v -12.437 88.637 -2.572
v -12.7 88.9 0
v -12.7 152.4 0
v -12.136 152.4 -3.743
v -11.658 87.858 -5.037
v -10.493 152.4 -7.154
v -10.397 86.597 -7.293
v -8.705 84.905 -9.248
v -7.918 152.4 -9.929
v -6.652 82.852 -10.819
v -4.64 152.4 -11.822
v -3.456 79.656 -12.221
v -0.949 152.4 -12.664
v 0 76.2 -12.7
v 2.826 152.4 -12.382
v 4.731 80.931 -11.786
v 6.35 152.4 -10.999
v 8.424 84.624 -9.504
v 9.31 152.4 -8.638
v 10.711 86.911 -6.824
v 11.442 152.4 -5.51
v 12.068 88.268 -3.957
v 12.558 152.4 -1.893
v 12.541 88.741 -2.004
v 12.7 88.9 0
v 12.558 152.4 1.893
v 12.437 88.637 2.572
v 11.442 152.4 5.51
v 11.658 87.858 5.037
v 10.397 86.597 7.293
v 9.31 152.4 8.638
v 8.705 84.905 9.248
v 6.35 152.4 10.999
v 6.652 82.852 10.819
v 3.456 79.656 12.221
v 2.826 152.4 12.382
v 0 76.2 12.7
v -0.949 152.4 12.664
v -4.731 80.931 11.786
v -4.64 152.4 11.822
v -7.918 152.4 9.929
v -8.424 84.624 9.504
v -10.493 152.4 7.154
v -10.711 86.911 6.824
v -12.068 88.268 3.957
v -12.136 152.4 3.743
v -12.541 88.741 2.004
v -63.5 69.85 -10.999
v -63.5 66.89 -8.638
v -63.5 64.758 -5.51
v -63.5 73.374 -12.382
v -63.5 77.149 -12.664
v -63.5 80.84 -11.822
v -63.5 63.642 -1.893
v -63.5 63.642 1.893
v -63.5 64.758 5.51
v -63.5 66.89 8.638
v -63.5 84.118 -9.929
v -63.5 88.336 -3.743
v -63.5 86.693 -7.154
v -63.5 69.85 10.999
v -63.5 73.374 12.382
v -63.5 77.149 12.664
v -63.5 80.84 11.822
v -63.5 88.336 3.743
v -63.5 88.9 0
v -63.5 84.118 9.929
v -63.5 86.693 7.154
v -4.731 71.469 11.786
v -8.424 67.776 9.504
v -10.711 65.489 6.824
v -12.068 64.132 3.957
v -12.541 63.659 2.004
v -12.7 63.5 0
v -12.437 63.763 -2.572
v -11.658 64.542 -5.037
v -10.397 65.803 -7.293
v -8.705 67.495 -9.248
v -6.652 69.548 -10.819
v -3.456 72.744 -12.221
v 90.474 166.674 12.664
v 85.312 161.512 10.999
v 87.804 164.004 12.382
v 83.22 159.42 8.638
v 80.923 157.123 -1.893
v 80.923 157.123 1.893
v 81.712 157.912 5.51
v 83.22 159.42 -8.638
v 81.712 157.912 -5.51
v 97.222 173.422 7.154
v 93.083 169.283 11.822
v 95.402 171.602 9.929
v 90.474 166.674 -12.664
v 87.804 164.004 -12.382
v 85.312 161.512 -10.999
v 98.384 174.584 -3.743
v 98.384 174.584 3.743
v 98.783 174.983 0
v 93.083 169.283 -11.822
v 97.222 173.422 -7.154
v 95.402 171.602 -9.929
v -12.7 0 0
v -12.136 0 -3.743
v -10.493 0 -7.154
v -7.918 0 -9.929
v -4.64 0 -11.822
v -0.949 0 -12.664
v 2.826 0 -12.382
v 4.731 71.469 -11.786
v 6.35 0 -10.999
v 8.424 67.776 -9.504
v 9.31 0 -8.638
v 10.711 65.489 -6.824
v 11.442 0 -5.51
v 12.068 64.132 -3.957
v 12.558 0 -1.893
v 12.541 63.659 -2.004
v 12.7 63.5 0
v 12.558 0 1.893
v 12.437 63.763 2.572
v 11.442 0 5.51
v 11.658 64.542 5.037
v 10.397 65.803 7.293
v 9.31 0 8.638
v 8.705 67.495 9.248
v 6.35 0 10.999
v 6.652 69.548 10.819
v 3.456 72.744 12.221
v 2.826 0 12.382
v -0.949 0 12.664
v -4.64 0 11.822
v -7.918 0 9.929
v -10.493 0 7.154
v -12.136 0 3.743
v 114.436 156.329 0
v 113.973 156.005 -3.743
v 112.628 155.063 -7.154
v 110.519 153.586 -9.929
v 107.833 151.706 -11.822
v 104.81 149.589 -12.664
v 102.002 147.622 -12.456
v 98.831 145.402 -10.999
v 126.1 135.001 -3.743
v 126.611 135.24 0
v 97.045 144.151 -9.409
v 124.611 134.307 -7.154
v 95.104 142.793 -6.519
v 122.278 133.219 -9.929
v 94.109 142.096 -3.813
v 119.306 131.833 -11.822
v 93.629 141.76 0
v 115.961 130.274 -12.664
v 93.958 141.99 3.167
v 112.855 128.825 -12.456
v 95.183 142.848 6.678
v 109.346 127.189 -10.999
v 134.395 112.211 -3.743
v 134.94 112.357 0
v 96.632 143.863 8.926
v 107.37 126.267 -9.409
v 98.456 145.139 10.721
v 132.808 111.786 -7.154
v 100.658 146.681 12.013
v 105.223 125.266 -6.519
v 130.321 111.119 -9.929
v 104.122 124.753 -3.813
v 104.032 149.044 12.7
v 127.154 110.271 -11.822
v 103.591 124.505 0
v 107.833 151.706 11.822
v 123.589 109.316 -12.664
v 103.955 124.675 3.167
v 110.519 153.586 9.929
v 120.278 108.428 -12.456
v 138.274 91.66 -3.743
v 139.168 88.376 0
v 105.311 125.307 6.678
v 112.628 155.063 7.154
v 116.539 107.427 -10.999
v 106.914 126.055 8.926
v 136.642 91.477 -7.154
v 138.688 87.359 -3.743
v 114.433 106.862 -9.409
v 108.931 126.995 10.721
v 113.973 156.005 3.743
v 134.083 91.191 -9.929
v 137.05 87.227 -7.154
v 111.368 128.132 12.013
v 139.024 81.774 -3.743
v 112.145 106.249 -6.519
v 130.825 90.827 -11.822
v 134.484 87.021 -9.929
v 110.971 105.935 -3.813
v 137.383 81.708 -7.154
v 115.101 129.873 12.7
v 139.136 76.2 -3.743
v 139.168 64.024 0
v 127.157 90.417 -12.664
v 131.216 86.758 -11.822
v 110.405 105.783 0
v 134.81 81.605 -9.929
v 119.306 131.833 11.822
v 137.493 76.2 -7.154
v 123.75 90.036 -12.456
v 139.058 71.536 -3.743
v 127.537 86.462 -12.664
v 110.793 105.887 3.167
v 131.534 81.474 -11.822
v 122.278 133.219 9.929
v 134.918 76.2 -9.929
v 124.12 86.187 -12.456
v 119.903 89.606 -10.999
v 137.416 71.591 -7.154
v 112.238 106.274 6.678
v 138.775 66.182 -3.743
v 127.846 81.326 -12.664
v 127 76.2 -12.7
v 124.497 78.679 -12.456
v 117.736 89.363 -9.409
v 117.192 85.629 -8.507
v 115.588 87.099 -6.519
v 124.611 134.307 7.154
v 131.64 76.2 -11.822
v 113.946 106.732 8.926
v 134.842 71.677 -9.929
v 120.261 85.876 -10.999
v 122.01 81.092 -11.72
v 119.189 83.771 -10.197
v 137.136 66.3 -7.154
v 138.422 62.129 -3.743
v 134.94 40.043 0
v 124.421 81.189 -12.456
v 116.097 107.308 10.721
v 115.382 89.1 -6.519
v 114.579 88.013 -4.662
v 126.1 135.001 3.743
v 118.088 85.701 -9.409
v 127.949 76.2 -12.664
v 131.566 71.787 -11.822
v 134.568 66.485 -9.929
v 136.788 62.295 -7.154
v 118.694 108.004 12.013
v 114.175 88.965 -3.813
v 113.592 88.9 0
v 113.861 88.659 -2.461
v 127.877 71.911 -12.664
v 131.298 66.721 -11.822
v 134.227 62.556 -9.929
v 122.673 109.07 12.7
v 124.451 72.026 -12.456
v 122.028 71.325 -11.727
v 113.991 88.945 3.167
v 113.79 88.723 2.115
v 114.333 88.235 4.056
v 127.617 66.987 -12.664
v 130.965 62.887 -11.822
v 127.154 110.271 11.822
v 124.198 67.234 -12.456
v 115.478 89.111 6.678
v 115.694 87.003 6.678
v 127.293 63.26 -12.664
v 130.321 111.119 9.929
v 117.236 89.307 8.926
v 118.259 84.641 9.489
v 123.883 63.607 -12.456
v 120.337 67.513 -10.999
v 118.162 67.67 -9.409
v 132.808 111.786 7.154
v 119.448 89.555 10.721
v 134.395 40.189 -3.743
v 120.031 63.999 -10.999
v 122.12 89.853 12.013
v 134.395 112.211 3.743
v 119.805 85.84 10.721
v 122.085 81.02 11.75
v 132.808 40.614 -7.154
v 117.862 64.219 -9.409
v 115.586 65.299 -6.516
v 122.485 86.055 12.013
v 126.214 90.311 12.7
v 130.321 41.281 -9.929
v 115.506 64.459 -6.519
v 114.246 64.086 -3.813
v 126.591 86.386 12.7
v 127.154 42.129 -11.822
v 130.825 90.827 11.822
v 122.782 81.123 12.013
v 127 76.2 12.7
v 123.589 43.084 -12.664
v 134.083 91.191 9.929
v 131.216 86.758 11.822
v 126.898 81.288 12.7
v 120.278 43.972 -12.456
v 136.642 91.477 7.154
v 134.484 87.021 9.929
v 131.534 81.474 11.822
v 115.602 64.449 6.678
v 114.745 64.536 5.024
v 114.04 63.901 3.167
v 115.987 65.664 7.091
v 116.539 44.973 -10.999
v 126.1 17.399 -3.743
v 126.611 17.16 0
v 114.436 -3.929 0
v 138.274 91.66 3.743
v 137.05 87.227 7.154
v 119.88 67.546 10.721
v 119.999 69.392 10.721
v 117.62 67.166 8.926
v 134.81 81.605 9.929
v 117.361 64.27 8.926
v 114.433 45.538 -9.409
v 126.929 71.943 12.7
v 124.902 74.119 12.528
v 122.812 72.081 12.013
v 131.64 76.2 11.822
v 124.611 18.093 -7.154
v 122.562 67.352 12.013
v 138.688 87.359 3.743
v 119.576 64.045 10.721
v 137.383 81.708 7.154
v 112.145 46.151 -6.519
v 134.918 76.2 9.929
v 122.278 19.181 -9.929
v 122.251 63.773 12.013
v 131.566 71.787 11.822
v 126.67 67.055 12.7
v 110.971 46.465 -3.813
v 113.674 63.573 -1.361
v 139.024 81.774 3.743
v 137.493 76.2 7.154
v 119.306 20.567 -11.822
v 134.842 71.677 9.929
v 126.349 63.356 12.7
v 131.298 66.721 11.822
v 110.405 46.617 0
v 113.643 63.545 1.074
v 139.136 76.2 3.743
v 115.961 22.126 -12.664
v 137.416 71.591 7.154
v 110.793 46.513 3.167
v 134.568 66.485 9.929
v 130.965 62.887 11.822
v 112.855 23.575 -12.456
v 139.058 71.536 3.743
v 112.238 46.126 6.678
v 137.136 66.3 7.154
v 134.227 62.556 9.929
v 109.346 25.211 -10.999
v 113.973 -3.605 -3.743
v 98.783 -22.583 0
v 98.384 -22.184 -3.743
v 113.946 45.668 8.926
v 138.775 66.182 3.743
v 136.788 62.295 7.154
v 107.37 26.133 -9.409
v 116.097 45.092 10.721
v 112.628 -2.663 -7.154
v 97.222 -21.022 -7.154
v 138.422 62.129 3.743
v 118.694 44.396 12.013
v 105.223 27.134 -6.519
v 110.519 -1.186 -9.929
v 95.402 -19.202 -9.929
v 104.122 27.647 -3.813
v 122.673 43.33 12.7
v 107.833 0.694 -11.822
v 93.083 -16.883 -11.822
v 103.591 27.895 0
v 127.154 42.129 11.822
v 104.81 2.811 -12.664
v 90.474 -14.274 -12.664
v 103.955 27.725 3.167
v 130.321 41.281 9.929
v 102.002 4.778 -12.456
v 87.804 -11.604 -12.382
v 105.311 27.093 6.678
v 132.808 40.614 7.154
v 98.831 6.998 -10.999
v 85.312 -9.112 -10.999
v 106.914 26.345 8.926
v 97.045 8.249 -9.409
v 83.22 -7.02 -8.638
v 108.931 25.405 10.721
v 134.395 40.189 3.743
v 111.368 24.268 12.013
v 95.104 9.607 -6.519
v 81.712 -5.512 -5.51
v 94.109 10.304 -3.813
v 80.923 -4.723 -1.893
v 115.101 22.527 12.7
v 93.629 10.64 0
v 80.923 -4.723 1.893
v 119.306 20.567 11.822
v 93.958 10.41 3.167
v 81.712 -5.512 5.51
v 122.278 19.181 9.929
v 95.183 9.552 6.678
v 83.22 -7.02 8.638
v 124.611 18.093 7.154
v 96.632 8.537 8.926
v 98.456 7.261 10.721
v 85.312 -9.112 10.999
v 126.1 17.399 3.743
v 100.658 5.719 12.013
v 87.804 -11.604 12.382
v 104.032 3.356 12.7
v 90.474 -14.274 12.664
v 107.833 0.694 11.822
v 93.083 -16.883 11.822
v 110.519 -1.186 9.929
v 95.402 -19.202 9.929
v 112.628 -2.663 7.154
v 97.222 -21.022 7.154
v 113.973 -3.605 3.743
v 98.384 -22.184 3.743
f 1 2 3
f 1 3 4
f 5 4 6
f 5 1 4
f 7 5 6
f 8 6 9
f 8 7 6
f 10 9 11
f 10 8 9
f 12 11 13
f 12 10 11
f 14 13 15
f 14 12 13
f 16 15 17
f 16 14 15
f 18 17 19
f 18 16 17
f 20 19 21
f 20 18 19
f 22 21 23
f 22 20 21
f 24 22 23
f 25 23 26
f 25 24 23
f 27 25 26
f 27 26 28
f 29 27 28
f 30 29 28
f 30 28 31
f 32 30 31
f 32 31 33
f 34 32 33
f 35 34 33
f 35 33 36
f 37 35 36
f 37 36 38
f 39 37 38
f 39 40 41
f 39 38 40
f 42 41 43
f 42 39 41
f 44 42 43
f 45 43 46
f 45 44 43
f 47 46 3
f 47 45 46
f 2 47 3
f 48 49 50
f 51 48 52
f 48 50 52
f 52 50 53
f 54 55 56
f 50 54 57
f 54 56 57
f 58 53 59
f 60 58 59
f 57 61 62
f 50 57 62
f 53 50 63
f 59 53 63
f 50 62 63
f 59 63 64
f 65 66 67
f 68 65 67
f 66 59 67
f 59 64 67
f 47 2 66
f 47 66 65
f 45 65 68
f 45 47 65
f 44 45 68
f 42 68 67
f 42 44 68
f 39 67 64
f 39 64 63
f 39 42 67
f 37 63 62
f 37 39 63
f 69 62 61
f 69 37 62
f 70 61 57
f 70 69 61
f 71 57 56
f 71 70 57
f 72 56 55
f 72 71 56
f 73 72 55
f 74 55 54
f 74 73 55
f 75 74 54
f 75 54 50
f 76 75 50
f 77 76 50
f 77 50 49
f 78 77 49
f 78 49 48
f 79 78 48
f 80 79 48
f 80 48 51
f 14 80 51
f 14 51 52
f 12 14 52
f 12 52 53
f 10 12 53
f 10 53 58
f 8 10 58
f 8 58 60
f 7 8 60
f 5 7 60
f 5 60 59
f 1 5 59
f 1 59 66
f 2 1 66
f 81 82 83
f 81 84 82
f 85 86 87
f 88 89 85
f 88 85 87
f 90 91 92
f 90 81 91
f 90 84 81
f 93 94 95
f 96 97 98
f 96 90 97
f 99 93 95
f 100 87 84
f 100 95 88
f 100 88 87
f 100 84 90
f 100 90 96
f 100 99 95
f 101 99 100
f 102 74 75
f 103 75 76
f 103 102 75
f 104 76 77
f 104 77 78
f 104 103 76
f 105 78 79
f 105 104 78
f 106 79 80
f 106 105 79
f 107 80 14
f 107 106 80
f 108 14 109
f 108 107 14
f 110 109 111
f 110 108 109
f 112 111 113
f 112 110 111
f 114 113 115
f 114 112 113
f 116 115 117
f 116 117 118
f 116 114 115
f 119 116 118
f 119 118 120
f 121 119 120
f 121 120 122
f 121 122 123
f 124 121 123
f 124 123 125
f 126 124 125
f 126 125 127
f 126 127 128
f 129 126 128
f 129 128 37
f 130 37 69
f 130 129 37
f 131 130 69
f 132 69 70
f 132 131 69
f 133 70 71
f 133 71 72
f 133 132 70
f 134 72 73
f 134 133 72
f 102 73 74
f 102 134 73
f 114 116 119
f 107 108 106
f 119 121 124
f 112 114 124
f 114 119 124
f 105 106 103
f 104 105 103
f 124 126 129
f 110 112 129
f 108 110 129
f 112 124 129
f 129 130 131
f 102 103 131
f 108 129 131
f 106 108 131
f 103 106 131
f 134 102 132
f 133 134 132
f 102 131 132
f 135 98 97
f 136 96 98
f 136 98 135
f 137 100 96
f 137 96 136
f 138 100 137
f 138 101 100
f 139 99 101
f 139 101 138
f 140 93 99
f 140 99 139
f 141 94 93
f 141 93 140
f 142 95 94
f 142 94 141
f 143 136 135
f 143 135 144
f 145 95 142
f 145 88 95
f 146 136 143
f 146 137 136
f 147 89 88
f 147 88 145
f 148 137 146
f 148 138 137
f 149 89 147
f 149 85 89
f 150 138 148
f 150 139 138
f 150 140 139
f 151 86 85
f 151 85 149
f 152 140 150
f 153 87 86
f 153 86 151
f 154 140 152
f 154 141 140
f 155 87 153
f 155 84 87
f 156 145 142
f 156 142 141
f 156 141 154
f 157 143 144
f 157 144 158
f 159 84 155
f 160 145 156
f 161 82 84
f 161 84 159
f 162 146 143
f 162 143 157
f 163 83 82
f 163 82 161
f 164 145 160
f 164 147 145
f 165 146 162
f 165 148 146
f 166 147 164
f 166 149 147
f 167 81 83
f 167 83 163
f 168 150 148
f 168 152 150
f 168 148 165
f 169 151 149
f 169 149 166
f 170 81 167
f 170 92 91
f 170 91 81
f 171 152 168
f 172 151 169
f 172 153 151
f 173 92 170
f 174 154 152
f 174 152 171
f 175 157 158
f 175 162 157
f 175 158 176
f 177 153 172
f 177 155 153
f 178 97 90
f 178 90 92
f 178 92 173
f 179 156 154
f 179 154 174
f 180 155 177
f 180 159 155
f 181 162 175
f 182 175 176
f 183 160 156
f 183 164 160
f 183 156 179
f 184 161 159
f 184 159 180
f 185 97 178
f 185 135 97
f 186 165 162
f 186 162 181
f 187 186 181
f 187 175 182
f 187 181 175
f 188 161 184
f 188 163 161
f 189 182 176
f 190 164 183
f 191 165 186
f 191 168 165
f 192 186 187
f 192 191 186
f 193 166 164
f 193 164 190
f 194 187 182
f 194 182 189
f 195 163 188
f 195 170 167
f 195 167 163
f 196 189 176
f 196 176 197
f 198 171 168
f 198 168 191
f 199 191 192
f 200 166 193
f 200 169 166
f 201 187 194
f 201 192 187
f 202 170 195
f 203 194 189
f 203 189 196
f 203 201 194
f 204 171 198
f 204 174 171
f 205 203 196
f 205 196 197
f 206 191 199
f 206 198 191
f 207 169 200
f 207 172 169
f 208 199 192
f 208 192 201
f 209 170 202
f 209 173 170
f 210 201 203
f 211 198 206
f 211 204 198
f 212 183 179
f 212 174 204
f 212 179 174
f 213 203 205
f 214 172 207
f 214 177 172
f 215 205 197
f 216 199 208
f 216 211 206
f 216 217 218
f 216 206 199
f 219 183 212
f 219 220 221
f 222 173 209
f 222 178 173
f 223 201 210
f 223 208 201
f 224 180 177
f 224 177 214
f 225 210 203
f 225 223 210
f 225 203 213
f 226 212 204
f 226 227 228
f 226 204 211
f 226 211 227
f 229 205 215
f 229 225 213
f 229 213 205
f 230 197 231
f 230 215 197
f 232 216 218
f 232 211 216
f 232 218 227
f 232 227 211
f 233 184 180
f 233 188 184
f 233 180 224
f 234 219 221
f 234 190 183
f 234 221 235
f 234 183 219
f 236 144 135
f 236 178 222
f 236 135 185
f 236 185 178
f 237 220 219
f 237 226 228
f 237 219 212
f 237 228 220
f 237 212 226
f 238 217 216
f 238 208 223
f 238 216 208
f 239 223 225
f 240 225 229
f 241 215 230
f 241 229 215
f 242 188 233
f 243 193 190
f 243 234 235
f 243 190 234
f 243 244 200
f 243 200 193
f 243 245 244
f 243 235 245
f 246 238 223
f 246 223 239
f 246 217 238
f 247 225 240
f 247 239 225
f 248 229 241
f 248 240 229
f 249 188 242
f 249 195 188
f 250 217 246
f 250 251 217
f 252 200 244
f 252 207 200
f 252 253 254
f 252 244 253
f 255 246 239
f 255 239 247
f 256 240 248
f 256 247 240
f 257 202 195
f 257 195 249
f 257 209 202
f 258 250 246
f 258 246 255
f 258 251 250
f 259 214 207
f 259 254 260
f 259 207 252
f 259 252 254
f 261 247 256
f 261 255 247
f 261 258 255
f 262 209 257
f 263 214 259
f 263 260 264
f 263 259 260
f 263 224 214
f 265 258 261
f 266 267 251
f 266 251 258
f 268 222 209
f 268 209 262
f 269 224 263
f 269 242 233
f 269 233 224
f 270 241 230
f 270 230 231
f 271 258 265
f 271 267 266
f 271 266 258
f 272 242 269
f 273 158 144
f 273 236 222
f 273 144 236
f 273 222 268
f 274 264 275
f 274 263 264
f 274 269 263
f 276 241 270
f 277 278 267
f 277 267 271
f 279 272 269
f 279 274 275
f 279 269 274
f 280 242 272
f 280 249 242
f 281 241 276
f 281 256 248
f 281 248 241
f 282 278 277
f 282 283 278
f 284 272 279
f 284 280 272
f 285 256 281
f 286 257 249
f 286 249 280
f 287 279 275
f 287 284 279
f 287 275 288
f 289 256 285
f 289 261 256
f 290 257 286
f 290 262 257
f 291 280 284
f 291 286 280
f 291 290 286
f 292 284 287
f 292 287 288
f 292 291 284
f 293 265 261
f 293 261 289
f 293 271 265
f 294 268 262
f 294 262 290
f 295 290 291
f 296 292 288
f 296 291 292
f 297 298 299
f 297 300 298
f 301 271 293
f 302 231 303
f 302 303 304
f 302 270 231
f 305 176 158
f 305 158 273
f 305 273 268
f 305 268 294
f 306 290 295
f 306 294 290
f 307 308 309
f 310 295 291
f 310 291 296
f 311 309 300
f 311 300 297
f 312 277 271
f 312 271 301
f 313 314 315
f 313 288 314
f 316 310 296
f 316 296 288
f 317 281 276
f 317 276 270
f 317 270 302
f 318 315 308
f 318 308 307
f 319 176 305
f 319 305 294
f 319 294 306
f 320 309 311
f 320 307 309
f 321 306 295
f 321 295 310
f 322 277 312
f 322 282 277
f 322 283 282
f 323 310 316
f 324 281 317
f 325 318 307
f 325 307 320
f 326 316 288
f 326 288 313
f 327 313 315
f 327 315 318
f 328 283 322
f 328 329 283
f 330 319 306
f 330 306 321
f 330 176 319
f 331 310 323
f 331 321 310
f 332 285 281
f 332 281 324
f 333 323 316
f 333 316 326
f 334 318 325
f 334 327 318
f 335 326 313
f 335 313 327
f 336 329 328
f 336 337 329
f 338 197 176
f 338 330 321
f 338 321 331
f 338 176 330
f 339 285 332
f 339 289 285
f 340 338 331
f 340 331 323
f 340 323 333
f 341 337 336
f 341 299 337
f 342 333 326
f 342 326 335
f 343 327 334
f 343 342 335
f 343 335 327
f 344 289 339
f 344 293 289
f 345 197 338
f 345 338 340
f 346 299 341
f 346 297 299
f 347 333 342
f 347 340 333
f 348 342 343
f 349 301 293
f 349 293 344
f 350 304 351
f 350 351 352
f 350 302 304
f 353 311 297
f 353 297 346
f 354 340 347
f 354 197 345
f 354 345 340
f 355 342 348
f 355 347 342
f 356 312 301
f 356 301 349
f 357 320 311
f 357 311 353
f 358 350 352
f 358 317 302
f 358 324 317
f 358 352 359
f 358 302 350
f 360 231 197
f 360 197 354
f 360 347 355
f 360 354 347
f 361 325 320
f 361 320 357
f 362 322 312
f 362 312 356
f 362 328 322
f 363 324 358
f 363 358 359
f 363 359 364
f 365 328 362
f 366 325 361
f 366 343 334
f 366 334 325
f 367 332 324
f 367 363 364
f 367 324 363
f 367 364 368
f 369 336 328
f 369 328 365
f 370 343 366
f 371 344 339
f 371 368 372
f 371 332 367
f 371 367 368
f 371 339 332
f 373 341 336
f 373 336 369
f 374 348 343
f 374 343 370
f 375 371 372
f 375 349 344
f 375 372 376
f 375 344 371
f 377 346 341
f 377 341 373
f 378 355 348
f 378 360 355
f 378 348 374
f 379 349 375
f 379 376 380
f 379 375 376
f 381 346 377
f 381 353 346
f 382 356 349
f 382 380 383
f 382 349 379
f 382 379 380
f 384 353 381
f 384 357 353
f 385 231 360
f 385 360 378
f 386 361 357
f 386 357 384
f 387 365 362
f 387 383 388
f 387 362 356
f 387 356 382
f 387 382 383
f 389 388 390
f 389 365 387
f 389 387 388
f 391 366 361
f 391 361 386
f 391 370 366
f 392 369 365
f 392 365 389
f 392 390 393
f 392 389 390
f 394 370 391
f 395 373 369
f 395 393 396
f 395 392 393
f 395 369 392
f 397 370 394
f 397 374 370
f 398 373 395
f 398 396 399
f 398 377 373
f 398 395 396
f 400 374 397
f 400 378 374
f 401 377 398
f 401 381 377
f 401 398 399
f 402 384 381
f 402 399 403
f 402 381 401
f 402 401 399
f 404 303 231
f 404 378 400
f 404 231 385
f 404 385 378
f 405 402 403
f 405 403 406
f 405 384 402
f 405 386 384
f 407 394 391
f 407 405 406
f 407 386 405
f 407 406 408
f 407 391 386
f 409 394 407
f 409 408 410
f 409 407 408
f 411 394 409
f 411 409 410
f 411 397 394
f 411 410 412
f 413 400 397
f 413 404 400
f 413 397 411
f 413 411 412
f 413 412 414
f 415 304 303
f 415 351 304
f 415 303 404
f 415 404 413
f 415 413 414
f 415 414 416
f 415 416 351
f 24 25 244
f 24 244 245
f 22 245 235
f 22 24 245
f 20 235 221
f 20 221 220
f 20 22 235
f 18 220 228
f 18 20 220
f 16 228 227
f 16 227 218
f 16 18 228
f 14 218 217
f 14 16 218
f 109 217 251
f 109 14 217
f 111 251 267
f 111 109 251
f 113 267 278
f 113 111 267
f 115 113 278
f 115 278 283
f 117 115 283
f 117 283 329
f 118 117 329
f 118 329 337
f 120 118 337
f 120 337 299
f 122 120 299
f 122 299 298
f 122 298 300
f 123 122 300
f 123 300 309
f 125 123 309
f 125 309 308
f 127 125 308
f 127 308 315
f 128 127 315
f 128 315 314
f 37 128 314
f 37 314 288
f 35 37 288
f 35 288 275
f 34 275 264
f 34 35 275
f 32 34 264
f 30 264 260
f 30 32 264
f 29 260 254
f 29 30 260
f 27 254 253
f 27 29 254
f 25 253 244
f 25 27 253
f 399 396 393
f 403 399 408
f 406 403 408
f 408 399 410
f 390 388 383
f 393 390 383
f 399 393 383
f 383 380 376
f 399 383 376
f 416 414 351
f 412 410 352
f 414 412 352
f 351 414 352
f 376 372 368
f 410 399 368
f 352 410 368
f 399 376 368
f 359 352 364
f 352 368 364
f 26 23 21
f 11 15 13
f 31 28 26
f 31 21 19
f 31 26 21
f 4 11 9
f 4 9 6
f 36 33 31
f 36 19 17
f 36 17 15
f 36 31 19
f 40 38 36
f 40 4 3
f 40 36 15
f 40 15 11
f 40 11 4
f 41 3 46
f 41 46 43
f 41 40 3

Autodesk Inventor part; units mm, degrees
ref_plane "YZ Plane" through (0, 0, 0) normal (1, 0, 0) x (0, 1, 0)
sketch "Sketch1" plane through (0, 0, 0) normal (0, 1, 0) x (-1, 0, 0)
  circle A0 centre (0, 0) radius 12.7
  dimension "d0" = 25.4
extrude "Extrusion1" add sketch "Sketch1" along normal blind 152.4
sketch "Sketch2" plane through (0, 0, 0) normal (1, 0, 0) x (0, 1, 0)
  circle A0 centre (76.2, 0) radius 12.7
  point P0 (0, 0)
extrude "Extrusion2" add sketch "Sketch2" along normal blind 127 and the other way blind 63.5
ref_plane "Work Plane1" through (0, 76.2, 0) normal (0, 1, 0) x (1, 0, 0)
sketch "Sketch3" plane through (0, 76.2, 0) normal (0, 1, 0) x (1, 0, 0)
  line L0 (127, -12.7) -> (127, 12.7) projected
  circle A0 centre (127, 0) radius 12.7
  line L1 (0, -22.5547) -> (0, 28.0783)
  point P0 (0, 0)
revolve "Revolution1" add sketch "Sketch3" angle 90 mid plane about axis through (0, 76.2, 22.5547) along (0, 0, -1)
ref_plane "Work Plane3" through (139.7, 76.2, 12.7) normal (-1, 0, 0) x (0, 0, 1)
ref_plane "Work Plane2" through (127, 76.2, 12.7) normal (-1, 0, 0) x (0, 0, 1)
properties part number "anchorPlaceholder"
